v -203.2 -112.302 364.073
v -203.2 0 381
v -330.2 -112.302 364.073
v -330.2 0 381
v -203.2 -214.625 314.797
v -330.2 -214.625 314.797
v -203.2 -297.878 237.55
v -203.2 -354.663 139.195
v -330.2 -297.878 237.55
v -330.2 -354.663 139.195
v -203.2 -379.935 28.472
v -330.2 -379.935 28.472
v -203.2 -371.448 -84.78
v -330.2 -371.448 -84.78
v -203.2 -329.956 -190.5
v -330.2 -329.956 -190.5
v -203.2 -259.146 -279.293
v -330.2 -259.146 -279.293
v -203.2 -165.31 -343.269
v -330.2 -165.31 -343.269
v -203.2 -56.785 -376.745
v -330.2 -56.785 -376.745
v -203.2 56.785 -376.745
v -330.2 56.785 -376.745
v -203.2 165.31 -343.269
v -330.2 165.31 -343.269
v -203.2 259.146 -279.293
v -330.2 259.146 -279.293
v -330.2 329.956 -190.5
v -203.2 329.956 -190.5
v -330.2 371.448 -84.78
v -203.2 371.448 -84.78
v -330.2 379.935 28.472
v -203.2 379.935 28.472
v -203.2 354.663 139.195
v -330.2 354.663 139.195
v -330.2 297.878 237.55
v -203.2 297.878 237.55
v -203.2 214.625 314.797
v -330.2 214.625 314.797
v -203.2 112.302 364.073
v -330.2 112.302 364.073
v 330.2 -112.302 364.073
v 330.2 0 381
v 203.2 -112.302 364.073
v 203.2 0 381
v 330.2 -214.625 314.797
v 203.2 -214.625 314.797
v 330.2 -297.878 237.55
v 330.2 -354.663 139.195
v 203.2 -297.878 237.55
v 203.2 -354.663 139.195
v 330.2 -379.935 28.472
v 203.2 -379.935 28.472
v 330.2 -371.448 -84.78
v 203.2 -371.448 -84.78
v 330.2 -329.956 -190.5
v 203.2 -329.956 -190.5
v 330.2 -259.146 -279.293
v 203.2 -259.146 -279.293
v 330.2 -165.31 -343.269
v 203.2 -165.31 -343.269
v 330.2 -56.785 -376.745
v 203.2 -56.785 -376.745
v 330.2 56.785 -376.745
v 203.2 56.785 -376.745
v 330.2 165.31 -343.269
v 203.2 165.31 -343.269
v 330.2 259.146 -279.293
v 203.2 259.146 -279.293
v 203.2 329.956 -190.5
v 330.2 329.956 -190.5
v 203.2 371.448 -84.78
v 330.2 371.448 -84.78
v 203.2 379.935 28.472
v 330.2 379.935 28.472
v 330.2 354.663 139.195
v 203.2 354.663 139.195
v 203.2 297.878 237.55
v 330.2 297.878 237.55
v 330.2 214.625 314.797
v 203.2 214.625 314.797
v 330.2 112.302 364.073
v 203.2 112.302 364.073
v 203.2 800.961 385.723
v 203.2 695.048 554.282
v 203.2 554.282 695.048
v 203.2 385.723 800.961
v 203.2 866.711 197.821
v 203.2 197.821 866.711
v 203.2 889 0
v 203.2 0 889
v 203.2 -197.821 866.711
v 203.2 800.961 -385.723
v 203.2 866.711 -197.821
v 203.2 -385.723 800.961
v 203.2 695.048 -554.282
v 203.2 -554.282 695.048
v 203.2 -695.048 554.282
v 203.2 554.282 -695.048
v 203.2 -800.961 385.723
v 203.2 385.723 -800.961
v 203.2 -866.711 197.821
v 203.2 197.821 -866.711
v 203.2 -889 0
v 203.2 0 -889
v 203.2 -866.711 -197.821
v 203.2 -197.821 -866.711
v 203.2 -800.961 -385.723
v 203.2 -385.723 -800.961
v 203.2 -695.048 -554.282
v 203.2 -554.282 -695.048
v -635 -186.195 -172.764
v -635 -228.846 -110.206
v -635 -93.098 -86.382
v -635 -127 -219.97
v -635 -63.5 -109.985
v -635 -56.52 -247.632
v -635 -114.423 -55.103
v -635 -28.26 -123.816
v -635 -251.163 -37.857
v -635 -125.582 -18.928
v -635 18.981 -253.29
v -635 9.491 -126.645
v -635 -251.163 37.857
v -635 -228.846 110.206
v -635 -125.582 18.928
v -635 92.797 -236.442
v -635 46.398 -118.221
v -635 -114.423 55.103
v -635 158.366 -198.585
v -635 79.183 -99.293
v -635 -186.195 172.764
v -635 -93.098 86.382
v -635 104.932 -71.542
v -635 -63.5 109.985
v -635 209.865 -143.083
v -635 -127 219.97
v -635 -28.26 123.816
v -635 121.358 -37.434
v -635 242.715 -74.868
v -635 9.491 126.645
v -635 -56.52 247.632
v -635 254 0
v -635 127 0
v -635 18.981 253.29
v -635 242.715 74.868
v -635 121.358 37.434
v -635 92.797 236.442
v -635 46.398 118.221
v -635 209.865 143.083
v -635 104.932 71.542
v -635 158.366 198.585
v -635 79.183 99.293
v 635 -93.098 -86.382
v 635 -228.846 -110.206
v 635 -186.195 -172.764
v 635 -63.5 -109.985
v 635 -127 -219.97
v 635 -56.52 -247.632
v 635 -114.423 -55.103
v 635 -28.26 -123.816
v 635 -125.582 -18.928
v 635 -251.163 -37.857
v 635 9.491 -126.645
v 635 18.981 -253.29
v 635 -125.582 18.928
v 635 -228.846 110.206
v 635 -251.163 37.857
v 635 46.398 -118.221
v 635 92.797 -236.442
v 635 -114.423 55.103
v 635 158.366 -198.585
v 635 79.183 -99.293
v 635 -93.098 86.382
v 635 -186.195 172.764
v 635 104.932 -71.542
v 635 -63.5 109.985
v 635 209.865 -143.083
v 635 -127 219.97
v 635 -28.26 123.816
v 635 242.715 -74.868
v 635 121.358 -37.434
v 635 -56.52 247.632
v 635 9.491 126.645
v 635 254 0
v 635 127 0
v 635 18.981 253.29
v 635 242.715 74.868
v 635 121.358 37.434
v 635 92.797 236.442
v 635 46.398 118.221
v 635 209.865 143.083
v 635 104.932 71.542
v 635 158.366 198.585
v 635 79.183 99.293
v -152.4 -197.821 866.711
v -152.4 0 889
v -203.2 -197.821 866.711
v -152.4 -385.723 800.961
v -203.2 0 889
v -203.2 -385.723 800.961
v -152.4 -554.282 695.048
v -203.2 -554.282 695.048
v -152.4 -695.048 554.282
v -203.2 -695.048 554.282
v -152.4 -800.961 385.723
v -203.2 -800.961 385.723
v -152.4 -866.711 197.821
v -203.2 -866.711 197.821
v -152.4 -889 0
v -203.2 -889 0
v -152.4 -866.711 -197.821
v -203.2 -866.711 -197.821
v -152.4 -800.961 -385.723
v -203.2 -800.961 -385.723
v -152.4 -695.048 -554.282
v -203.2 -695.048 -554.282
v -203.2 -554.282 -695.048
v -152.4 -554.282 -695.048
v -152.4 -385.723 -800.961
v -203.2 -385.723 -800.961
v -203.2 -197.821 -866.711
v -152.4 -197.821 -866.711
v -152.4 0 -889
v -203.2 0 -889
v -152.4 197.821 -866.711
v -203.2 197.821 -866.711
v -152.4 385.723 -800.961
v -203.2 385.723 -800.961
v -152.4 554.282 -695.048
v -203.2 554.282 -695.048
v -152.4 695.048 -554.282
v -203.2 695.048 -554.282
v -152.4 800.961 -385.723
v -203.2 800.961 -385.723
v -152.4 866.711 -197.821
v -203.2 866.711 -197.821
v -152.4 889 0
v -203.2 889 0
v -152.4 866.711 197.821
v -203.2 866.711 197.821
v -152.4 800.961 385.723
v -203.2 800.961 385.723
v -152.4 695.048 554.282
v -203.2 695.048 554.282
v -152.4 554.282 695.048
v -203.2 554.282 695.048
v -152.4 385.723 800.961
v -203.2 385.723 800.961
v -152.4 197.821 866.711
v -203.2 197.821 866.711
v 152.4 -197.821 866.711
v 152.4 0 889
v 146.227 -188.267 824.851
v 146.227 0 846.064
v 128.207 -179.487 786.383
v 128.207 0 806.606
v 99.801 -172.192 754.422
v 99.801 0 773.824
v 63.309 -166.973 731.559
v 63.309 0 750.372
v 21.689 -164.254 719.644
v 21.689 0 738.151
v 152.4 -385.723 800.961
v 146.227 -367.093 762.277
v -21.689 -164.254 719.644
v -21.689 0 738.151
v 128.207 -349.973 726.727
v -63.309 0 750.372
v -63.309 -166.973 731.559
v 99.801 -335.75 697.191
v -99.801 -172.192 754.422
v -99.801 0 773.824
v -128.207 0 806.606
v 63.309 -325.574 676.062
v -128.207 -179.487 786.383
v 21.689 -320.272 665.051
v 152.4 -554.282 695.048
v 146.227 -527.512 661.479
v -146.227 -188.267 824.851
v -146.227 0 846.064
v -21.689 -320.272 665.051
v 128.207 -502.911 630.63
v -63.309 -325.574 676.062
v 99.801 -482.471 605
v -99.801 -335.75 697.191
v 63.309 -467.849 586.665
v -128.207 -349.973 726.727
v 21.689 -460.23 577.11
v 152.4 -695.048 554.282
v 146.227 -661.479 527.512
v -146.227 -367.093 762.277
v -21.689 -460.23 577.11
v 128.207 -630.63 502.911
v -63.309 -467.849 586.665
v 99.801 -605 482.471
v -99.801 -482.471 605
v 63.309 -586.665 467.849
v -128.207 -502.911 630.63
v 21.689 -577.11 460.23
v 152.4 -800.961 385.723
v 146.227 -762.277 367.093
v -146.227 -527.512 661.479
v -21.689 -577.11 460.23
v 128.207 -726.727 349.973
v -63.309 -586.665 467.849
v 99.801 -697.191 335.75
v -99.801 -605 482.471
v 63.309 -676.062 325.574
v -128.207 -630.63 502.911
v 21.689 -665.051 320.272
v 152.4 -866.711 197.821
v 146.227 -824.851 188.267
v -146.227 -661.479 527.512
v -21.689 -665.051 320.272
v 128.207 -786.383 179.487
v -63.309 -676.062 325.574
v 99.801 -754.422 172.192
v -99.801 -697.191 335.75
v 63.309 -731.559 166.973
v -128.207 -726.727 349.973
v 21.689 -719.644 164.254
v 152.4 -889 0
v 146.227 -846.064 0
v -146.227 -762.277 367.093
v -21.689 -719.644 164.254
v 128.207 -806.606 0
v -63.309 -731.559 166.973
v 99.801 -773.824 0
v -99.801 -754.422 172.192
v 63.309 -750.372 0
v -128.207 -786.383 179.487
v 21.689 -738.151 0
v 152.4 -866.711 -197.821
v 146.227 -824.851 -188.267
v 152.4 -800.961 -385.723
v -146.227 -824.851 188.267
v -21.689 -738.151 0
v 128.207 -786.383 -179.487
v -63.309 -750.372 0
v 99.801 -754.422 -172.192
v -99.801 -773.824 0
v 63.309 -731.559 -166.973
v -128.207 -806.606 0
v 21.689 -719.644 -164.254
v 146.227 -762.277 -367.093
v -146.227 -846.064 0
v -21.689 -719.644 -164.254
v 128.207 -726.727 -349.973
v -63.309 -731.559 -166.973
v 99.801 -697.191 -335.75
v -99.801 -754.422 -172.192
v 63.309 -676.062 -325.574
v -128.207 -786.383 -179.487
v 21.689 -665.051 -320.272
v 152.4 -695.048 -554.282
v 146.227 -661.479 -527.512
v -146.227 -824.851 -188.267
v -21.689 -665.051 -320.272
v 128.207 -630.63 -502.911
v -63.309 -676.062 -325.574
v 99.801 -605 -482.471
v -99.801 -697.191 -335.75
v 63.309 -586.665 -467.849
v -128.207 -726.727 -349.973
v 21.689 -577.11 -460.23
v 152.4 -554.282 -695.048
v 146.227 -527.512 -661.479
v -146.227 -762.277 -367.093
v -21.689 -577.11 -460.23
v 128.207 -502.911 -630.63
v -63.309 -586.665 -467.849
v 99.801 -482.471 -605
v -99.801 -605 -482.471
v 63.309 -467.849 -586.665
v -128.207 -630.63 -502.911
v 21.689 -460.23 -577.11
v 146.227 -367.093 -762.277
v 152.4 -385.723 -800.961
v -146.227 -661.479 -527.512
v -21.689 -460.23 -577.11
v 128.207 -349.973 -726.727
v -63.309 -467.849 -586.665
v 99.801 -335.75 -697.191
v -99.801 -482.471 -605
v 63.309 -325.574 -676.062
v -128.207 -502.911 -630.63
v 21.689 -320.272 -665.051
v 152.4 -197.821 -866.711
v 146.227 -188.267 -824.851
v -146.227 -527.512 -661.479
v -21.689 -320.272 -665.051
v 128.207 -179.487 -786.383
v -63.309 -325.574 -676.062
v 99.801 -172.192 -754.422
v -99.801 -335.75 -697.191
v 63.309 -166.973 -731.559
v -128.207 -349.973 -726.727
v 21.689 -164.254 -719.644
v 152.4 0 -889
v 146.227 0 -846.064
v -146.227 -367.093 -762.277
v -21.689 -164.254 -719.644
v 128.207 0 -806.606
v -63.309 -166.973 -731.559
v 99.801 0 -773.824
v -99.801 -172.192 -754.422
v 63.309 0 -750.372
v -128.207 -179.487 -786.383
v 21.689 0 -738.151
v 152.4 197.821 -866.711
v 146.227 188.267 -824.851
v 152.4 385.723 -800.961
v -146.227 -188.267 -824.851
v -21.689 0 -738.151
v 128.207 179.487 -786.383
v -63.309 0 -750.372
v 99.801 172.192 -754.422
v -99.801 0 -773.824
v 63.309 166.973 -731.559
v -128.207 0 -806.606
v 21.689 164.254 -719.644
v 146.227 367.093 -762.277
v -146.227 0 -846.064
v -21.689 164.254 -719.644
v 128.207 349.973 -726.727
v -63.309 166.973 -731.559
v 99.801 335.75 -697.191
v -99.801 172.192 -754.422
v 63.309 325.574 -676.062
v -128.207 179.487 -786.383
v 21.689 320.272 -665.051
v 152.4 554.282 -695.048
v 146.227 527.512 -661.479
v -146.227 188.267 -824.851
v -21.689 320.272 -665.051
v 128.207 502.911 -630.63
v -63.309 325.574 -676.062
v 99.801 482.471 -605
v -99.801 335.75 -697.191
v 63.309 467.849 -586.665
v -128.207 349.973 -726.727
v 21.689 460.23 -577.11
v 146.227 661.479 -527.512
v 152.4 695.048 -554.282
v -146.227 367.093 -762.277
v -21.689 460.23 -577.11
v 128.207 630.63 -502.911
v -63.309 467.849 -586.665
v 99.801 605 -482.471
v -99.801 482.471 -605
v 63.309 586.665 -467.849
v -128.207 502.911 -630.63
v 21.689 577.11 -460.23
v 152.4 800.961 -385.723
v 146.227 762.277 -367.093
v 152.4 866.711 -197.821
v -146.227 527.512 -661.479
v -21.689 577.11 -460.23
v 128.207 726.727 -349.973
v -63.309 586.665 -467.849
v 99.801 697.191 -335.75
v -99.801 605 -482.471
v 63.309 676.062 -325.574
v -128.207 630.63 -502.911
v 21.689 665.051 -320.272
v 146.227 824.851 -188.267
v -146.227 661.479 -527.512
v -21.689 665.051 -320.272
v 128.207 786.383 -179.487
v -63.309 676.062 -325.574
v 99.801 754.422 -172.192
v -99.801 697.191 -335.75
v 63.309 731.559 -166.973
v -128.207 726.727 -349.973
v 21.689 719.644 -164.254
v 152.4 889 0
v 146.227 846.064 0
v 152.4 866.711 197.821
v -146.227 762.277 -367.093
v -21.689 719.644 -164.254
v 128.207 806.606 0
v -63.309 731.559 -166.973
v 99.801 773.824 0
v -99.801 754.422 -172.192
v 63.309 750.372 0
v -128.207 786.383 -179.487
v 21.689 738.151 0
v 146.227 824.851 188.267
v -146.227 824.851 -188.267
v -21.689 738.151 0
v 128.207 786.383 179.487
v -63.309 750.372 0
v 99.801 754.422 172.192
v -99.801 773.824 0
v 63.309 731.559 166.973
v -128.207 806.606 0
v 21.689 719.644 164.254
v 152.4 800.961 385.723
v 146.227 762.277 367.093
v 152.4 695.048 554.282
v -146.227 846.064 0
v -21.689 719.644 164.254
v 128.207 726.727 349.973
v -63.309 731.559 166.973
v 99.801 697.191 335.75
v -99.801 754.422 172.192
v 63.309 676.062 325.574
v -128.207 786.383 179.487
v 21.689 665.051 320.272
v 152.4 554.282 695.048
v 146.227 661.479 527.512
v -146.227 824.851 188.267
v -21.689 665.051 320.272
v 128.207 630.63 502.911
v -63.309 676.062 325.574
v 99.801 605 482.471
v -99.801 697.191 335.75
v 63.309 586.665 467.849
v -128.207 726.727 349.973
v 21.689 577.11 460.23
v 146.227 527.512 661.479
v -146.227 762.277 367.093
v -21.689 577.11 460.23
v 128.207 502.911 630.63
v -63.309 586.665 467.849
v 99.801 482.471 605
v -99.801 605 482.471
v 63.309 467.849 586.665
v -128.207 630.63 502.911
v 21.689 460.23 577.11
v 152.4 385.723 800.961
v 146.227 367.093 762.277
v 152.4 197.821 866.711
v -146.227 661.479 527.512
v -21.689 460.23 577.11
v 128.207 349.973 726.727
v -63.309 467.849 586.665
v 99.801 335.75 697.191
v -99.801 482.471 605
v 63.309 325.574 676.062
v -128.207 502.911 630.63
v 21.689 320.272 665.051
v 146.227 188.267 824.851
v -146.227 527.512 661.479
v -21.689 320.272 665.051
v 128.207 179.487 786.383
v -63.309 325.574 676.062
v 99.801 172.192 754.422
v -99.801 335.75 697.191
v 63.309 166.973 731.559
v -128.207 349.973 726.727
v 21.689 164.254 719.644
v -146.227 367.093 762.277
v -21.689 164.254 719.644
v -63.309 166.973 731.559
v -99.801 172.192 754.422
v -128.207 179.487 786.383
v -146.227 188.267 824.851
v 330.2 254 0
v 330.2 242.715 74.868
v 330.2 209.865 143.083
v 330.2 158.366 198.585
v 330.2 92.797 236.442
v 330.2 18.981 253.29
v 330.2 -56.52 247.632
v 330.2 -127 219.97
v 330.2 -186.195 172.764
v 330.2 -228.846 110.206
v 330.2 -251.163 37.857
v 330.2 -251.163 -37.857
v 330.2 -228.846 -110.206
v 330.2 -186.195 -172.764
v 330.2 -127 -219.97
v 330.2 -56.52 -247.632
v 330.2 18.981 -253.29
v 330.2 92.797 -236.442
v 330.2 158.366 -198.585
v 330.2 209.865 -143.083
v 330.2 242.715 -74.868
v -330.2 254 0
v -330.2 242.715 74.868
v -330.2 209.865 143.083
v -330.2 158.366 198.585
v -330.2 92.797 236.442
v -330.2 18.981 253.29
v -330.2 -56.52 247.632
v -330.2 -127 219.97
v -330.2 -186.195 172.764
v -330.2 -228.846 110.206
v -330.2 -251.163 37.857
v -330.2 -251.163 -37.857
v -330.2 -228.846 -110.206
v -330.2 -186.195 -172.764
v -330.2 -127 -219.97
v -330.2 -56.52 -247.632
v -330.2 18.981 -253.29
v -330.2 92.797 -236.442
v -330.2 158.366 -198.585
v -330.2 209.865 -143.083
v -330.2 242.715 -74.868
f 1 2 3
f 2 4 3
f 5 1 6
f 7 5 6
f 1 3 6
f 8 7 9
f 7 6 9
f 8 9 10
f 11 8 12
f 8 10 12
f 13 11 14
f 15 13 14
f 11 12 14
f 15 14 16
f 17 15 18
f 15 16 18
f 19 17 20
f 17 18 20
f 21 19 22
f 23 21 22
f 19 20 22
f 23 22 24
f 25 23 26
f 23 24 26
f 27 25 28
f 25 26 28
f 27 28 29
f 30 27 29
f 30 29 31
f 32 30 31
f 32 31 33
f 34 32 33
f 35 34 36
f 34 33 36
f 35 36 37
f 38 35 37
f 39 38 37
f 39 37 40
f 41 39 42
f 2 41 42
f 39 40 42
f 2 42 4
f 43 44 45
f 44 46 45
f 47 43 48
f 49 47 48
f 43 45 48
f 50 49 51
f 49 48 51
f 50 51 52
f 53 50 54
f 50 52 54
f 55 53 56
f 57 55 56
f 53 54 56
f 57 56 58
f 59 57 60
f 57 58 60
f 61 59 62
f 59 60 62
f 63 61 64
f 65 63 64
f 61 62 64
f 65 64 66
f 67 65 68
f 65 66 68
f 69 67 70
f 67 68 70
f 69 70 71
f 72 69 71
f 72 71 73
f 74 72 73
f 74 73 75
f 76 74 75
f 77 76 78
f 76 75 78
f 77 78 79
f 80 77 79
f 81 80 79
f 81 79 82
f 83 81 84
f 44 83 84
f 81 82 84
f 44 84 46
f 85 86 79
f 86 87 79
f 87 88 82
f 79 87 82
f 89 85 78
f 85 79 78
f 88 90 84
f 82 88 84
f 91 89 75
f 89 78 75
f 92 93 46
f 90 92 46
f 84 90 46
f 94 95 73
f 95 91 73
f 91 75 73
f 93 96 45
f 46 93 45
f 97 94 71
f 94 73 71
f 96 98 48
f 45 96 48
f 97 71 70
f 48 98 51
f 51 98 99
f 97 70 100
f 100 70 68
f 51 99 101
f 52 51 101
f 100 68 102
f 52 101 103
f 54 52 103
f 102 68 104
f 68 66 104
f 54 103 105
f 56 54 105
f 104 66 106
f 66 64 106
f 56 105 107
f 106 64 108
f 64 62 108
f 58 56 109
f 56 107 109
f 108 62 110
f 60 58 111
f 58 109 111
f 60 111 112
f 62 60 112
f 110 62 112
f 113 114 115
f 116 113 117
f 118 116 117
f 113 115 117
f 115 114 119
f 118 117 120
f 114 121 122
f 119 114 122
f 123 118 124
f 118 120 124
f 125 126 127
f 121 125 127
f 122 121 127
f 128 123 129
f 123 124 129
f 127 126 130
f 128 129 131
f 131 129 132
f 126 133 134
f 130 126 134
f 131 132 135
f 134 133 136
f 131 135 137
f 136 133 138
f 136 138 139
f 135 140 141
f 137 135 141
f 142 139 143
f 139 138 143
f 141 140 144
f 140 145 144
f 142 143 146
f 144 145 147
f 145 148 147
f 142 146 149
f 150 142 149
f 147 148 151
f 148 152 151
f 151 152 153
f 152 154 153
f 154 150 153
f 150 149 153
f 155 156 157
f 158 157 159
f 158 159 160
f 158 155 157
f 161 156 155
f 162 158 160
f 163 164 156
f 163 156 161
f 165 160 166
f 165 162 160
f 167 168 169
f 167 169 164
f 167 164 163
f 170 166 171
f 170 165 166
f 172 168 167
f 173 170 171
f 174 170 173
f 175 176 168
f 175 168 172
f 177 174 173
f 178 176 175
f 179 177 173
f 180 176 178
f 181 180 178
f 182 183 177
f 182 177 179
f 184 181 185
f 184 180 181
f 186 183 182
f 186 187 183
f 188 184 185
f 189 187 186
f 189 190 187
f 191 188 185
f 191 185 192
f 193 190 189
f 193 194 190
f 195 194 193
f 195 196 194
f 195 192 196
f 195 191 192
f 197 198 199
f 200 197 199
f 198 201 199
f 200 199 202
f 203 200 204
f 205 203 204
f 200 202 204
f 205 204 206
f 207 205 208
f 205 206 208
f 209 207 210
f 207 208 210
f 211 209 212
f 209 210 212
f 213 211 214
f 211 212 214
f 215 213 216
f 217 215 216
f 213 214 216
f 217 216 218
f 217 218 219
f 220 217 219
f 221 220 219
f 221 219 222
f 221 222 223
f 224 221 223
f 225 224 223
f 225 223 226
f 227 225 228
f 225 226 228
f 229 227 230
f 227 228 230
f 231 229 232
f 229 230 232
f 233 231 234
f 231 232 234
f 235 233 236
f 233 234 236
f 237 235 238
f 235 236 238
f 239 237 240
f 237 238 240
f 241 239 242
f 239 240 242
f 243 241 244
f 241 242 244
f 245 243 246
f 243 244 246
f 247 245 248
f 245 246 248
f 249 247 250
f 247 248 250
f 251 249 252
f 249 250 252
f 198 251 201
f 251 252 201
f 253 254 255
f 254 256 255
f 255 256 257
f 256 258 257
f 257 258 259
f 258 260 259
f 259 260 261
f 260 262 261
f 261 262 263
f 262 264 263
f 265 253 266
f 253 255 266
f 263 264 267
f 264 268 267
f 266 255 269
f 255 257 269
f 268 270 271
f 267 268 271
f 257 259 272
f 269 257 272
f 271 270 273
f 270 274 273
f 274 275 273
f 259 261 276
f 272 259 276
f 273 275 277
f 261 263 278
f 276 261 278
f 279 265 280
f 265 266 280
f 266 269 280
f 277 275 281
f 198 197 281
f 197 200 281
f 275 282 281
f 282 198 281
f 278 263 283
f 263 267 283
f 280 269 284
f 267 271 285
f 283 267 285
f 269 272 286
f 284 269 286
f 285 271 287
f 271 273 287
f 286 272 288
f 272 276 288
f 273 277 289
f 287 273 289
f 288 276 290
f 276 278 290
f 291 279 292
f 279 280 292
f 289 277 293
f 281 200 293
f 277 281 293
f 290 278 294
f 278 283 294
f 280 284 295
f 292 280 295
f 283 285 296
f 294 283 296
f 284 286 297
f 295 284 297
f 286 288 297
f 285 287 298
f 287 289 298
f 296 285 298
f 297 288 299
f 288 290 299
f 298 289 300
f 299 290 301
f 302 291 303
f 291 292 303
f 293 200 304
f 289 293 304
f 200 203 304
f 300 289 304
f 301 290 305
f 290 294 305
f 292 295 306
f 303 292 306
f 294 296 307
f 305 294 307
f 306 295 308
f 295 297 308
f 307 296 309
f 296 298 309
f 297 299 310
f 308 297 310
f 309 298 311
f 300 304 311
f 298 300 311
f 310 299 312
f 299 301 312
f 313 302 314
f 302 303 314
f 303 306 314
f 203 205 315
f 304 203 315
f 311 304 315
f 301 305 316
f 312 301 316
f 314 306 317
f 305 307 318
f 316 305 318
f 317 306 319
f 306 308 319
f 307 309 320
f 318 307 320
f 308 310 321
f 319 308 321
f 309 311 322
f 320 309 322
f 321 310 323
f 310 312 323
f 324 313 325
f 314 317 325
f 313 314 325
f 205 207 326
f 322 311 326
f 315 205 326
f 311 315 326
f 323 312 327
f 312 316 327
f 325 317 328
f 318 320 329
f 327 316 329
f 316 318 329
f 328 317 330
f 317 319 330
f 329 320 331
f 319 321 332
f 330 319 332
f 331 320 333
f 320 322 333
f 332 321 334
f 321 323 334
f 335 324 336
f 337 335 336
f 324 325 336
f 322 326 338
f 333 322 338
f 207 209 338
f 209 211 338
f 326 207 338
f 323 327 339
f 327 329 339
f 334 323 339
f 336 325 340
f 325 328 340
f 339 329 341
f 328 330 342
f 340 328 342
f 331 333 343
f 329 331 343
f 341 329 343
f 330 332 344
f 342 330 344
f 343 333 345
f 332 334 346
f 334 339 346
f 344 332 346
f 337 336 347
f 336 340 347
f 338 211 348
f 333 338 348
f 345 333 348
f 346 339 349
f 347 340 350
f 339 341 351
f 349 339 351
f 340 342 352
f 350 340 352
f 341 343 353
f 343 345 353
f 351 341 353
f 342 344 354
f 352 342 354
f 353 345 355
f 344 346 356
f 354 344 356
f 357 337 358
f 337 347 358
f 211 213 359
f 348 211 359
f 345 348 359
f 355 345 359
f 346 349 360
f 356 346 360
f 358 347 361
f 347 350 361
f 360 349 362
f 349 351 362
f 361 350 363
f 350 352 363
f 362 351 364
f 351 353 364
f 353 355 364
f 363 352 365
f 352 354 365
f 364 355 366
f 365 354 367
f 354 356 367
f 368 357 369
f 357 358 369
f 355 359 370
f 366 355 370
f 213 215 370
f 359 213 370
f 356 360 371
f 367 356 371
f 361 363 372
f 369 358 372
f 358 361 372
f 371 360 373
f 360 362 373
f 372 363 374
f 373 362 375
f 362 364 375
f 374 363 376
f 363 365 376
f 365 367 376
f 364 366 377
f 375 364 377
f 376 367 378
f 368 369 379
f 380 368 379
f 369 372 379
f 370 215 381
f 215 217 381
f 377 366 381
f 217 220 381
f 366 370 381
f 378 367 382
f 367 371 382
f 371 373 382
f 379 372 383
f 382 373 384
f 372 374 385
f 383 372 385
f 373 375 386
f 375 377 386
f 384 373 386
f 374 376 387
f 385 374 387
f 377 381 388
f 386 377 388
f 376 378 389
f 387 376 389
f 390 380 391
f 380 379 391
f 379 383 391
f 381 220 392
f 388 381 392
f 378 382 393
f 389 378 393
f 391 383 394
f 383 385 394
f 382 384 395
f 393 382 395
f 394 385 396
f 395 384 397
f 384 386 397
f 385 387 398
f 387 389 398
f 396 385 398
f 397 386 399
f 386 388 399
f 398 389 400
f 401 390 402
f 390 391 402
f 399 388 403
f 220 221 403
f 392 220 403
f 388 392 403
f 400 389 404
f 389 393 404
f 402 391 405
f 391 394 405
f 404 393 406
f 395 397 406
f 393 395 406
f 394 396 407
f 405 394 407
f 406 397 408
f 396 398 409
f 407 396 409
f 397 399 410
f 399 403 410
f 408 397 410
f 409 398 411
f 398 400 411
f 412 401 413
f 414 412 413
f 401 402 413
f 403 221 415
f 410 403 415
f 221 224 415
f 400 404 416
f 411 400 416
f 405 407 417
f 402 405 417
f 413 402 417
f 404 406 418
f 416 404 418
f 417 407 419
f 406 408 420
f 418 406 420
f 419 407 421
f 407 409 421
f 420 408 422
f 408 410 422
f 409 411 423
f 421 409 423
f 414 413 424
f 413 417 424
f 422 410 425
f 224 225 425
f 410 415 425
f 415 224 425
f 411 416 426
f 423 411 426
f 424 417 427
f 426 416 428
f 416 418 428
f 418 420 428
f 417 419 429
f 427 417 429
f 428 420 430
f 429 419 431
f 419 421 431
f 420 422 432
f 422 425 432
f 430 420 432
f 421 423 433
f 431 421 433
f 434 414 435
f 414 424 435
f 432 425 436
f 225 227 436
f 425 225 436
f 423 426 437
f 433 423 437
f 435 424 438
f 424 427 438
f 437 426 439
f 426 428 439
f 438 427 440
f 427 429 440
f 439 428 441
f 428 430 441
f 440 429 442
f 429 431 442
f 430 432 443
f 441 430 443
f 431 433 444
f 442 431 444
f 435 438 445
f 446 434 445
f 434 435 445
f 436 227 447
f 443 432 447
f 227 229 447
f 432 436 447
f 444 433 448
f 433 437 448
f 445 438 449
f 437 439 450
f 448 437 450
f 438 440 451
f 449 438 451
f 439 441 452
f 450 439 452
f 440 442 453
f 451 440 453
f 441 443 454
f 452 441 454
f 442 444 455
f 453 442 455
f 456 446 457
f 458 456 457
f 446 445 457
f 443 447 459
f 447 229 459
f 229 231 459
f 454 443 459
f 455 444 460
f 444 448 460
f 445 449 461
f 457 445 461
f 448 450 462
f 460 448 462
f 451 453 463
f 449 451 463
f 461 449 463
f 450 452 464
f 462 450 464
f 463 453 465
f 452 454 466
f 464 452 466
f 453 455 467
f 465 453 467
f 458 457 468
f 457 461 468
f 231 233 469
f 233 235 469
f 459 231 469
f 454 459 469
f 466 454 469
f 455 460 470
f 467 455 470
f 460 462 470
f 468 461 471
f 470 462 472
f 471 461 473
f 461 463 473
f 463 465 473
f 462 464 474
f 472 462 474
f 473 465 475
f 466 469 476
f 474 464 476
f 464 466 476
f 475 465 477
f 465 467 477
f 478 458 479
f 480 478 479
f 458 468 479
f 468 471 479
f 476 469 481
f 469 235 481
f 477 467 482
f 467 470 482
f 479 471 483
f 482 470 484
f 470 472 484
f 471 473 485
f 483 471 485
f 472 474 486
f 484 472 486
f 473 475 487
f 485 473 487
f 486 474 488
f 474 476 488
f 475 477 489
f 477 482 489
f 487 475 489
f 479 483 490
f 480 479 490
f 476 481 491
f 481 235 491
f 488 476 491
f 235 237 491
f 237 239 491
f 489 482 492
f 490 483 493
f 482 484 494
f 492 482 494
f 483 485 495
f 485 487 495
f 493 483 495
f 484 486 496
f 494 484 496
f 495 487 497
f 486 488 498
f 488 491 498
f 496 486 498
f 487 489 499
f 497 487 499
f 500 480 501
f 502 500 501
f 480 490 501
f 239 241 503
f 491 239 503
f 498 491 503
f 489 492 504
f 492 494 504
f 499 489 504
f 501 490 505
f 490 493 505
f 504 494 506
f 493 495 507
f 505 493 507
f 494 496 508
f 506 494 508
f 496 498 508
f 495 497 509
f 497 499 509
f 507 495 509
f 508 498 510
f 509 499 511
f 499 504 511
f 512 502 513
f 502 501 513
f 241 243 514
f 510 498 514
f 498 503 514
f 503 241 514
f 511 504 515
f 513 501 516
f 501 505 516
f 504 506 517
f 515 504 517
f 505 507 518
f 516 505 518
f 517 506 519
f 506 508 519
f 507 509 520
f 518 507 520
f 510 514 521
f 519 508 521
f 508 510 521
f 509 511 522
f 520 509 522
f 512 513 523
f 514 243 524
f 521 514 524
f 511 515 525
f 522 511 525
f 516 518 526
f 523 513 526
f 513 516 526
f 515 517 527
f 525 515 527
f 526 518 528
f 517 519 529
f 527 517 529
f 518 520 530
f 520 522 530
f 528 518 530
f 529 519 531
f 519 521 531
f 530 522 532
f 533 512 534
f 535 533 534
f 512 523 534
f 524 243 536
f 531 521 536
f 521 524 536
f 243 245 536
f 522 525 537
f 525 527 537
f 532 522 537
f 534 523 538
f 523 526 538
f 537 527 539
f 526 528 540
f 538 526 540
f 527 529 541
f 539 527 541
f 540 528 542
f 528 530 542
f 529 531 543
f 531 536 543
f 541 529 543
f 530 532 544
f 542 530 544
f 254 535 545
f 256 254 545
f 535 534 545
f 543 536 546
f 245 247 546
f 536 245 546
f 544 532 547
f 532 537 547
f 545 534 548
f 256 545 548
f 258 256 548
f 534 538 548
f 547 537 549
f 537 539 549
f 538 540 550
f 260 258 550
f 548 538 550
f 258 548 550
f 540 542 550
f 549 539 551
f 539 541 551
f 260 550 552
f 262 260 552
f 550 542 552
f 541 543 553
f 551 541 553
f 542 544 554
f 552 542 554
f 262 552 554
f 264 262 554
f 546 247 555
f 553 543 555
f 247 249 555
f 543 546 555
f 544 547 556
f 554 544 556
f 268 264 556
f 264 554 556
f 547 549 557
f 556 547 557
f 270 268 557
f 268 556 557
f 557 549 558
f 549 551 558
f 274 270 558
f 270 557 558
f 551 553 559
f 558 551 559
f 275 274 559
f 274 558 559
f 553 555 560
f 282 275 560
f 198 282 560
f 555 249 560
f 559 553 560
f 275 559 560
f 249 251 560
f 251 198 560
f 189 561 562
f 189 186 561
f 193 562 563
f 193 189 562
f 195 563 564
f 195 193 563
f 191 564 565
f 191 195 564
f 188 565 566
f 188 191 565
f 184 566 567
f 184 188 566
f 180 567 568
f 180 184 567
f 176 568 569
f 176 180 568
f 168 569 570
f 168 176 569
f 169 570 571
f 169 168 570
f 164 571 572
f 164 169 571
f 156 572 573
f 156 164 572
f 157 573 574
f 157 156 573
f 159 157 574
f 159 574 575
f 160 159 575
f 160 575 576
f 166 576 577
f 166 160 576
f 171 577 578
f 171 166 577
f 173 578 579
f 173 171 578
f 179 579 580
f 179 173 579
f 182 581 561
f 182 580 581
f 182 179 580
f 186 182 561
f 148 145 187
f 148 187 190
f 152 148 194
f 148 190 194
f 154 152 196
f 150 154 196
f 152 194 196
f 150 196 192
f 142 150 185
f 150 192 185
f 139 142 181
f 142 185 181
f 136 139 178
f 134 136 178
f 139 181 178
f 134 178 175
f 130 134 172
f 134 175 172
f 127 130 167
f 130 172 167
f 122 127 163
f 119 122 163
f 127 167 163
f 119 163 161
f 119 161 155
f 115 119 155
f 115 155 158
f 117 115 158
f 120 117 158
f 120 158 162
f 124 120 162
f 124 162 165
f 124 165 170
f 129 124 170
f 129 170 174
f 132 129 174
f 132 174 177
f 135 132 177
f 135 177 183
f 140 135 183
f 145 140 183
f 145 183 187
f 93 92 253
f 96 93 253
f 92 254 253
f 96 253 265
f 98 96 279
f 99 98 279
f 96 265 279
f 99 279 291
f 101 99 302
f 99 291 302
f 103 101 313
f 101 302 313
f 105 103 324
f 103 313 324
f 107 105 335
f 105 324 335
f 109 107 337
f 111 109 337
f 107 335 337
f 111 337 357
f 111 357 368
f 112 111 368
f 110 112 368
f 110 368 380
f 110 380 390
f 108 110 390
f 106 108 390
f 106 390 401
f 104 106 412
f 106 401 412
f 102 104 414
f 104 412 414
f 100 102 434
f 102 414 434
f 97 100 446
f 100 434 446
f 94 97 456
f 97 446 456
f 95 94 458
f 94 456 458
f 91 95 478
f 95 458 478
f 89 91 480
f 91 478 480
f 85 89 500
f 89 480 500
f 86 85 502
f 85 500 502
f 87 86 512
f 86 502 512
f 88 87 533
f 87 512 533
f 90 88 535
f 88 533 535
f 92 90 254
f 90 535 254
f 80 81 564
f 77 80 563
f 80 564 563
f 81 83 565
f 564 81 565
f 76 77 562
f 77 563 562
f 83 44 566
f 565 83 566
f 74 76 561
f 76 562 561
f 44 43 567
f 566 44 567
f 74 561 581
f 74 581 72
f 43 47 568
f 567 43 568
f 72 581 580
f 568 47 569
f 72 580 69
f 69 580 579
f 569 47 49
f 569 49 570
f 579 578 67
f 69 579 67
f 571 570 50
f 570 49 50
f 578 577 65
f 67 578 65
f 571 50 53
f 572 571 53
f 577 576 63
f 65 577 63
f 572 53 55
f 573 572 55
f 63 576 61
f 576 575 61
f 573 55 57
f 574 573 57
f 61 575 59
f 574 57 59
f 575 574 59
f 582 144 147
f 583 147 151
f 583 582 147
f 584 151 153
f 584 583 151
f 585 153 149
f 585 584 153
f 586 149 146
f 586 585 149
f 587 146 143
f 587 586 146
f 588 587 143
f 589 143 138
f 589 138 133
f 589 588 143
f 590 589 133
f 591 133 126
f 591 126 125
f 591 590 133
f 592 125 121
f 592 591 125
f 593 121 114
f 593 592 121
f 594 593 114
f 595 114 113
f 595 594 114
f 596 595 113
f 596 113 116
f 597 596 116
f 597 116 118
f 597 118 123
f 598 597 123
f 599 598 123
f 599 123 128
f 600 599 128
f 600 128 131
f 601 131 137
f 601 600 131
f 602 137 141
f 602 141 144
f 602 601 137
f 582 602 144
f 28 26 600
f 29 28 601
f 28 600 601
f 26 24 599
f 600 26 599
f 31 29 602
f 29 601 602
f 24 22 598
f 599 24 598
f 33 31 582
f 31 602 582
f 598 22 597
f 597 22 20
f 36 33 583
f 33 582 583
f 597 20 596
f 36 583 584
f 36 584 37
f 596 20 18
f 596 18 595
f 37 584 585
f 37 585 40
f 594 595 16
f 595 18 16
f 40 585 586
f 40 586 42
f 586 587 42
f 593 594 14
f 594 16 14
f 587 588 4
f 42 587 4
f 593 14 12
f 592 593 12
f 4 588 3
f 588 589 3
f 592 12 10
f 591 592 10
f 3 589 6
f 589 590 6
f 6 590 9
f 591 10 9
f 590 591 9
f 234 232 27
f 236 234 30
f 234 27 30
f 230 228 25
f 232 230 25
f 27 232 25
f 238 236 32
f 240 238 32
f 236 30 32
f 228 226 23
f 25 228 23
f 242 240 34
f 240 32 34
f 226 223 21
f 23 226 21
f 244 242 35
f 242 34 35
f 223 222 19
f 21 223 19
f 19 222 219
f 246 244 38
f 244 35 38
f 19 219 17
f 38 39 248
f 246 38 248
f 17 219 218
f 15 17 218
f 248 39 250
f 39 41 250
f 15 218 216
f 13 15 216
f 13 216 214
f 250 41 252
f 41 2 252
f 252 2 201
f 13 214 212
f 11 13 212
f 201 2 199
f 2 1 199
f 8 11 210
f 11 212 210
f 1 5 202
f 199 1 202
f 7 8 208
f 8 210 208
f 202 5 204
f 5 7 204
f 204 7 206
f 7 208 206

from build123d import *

# Parameters (mm, degrees)
F2_R     = 254
F3_DEPTH = 635
F4_R     = 127
F5_DEPTH = 1270.001


with BuildPart() as f1:
    # F0 (on Front) → F1 (revolve)
    with BuildSketch(Plane.XZ):
        with BuildLine():
            Line((-330.2, 381), (-330.2, 254))
            Line((-330.2, 254), (330.2, 254))
            Line((330.2, 254), (330.2, 381))
            Line((330.2, 381), (203.2, 381))
            Line((203.2, 381), (203.2, 889))
            Line((203.2, 889), (152.4, 889))
            ThreePointArc((152.4, 889), (0, 736.6), (-152.4, 889))
            Line((-152.4, 889), (-203.2, 889))
            Line((-203.2, 889), (-203.2, 381))
            Line((-203.2, 381), (-330.2, 381))
        make_face()
    revolve(axis=Axis((165.1, 0, 0), (1, 0, 0)))

    # F2 (on Right) → F3 (join, symmetric)
    with BuildSketch(Plane.YZ):
        Circle(F2_R)
    extrude(amount=F3_DEPTH, both=True)

    # F4 (on face) → F5 (cut, through all)
    with BuildSketch(Plane.YZ.offset(635)):
        Circle(F4_R)
    extrude(amount=-F5_DEPTH, mode=Mode.SUBTRACT)


solid = f1.part
